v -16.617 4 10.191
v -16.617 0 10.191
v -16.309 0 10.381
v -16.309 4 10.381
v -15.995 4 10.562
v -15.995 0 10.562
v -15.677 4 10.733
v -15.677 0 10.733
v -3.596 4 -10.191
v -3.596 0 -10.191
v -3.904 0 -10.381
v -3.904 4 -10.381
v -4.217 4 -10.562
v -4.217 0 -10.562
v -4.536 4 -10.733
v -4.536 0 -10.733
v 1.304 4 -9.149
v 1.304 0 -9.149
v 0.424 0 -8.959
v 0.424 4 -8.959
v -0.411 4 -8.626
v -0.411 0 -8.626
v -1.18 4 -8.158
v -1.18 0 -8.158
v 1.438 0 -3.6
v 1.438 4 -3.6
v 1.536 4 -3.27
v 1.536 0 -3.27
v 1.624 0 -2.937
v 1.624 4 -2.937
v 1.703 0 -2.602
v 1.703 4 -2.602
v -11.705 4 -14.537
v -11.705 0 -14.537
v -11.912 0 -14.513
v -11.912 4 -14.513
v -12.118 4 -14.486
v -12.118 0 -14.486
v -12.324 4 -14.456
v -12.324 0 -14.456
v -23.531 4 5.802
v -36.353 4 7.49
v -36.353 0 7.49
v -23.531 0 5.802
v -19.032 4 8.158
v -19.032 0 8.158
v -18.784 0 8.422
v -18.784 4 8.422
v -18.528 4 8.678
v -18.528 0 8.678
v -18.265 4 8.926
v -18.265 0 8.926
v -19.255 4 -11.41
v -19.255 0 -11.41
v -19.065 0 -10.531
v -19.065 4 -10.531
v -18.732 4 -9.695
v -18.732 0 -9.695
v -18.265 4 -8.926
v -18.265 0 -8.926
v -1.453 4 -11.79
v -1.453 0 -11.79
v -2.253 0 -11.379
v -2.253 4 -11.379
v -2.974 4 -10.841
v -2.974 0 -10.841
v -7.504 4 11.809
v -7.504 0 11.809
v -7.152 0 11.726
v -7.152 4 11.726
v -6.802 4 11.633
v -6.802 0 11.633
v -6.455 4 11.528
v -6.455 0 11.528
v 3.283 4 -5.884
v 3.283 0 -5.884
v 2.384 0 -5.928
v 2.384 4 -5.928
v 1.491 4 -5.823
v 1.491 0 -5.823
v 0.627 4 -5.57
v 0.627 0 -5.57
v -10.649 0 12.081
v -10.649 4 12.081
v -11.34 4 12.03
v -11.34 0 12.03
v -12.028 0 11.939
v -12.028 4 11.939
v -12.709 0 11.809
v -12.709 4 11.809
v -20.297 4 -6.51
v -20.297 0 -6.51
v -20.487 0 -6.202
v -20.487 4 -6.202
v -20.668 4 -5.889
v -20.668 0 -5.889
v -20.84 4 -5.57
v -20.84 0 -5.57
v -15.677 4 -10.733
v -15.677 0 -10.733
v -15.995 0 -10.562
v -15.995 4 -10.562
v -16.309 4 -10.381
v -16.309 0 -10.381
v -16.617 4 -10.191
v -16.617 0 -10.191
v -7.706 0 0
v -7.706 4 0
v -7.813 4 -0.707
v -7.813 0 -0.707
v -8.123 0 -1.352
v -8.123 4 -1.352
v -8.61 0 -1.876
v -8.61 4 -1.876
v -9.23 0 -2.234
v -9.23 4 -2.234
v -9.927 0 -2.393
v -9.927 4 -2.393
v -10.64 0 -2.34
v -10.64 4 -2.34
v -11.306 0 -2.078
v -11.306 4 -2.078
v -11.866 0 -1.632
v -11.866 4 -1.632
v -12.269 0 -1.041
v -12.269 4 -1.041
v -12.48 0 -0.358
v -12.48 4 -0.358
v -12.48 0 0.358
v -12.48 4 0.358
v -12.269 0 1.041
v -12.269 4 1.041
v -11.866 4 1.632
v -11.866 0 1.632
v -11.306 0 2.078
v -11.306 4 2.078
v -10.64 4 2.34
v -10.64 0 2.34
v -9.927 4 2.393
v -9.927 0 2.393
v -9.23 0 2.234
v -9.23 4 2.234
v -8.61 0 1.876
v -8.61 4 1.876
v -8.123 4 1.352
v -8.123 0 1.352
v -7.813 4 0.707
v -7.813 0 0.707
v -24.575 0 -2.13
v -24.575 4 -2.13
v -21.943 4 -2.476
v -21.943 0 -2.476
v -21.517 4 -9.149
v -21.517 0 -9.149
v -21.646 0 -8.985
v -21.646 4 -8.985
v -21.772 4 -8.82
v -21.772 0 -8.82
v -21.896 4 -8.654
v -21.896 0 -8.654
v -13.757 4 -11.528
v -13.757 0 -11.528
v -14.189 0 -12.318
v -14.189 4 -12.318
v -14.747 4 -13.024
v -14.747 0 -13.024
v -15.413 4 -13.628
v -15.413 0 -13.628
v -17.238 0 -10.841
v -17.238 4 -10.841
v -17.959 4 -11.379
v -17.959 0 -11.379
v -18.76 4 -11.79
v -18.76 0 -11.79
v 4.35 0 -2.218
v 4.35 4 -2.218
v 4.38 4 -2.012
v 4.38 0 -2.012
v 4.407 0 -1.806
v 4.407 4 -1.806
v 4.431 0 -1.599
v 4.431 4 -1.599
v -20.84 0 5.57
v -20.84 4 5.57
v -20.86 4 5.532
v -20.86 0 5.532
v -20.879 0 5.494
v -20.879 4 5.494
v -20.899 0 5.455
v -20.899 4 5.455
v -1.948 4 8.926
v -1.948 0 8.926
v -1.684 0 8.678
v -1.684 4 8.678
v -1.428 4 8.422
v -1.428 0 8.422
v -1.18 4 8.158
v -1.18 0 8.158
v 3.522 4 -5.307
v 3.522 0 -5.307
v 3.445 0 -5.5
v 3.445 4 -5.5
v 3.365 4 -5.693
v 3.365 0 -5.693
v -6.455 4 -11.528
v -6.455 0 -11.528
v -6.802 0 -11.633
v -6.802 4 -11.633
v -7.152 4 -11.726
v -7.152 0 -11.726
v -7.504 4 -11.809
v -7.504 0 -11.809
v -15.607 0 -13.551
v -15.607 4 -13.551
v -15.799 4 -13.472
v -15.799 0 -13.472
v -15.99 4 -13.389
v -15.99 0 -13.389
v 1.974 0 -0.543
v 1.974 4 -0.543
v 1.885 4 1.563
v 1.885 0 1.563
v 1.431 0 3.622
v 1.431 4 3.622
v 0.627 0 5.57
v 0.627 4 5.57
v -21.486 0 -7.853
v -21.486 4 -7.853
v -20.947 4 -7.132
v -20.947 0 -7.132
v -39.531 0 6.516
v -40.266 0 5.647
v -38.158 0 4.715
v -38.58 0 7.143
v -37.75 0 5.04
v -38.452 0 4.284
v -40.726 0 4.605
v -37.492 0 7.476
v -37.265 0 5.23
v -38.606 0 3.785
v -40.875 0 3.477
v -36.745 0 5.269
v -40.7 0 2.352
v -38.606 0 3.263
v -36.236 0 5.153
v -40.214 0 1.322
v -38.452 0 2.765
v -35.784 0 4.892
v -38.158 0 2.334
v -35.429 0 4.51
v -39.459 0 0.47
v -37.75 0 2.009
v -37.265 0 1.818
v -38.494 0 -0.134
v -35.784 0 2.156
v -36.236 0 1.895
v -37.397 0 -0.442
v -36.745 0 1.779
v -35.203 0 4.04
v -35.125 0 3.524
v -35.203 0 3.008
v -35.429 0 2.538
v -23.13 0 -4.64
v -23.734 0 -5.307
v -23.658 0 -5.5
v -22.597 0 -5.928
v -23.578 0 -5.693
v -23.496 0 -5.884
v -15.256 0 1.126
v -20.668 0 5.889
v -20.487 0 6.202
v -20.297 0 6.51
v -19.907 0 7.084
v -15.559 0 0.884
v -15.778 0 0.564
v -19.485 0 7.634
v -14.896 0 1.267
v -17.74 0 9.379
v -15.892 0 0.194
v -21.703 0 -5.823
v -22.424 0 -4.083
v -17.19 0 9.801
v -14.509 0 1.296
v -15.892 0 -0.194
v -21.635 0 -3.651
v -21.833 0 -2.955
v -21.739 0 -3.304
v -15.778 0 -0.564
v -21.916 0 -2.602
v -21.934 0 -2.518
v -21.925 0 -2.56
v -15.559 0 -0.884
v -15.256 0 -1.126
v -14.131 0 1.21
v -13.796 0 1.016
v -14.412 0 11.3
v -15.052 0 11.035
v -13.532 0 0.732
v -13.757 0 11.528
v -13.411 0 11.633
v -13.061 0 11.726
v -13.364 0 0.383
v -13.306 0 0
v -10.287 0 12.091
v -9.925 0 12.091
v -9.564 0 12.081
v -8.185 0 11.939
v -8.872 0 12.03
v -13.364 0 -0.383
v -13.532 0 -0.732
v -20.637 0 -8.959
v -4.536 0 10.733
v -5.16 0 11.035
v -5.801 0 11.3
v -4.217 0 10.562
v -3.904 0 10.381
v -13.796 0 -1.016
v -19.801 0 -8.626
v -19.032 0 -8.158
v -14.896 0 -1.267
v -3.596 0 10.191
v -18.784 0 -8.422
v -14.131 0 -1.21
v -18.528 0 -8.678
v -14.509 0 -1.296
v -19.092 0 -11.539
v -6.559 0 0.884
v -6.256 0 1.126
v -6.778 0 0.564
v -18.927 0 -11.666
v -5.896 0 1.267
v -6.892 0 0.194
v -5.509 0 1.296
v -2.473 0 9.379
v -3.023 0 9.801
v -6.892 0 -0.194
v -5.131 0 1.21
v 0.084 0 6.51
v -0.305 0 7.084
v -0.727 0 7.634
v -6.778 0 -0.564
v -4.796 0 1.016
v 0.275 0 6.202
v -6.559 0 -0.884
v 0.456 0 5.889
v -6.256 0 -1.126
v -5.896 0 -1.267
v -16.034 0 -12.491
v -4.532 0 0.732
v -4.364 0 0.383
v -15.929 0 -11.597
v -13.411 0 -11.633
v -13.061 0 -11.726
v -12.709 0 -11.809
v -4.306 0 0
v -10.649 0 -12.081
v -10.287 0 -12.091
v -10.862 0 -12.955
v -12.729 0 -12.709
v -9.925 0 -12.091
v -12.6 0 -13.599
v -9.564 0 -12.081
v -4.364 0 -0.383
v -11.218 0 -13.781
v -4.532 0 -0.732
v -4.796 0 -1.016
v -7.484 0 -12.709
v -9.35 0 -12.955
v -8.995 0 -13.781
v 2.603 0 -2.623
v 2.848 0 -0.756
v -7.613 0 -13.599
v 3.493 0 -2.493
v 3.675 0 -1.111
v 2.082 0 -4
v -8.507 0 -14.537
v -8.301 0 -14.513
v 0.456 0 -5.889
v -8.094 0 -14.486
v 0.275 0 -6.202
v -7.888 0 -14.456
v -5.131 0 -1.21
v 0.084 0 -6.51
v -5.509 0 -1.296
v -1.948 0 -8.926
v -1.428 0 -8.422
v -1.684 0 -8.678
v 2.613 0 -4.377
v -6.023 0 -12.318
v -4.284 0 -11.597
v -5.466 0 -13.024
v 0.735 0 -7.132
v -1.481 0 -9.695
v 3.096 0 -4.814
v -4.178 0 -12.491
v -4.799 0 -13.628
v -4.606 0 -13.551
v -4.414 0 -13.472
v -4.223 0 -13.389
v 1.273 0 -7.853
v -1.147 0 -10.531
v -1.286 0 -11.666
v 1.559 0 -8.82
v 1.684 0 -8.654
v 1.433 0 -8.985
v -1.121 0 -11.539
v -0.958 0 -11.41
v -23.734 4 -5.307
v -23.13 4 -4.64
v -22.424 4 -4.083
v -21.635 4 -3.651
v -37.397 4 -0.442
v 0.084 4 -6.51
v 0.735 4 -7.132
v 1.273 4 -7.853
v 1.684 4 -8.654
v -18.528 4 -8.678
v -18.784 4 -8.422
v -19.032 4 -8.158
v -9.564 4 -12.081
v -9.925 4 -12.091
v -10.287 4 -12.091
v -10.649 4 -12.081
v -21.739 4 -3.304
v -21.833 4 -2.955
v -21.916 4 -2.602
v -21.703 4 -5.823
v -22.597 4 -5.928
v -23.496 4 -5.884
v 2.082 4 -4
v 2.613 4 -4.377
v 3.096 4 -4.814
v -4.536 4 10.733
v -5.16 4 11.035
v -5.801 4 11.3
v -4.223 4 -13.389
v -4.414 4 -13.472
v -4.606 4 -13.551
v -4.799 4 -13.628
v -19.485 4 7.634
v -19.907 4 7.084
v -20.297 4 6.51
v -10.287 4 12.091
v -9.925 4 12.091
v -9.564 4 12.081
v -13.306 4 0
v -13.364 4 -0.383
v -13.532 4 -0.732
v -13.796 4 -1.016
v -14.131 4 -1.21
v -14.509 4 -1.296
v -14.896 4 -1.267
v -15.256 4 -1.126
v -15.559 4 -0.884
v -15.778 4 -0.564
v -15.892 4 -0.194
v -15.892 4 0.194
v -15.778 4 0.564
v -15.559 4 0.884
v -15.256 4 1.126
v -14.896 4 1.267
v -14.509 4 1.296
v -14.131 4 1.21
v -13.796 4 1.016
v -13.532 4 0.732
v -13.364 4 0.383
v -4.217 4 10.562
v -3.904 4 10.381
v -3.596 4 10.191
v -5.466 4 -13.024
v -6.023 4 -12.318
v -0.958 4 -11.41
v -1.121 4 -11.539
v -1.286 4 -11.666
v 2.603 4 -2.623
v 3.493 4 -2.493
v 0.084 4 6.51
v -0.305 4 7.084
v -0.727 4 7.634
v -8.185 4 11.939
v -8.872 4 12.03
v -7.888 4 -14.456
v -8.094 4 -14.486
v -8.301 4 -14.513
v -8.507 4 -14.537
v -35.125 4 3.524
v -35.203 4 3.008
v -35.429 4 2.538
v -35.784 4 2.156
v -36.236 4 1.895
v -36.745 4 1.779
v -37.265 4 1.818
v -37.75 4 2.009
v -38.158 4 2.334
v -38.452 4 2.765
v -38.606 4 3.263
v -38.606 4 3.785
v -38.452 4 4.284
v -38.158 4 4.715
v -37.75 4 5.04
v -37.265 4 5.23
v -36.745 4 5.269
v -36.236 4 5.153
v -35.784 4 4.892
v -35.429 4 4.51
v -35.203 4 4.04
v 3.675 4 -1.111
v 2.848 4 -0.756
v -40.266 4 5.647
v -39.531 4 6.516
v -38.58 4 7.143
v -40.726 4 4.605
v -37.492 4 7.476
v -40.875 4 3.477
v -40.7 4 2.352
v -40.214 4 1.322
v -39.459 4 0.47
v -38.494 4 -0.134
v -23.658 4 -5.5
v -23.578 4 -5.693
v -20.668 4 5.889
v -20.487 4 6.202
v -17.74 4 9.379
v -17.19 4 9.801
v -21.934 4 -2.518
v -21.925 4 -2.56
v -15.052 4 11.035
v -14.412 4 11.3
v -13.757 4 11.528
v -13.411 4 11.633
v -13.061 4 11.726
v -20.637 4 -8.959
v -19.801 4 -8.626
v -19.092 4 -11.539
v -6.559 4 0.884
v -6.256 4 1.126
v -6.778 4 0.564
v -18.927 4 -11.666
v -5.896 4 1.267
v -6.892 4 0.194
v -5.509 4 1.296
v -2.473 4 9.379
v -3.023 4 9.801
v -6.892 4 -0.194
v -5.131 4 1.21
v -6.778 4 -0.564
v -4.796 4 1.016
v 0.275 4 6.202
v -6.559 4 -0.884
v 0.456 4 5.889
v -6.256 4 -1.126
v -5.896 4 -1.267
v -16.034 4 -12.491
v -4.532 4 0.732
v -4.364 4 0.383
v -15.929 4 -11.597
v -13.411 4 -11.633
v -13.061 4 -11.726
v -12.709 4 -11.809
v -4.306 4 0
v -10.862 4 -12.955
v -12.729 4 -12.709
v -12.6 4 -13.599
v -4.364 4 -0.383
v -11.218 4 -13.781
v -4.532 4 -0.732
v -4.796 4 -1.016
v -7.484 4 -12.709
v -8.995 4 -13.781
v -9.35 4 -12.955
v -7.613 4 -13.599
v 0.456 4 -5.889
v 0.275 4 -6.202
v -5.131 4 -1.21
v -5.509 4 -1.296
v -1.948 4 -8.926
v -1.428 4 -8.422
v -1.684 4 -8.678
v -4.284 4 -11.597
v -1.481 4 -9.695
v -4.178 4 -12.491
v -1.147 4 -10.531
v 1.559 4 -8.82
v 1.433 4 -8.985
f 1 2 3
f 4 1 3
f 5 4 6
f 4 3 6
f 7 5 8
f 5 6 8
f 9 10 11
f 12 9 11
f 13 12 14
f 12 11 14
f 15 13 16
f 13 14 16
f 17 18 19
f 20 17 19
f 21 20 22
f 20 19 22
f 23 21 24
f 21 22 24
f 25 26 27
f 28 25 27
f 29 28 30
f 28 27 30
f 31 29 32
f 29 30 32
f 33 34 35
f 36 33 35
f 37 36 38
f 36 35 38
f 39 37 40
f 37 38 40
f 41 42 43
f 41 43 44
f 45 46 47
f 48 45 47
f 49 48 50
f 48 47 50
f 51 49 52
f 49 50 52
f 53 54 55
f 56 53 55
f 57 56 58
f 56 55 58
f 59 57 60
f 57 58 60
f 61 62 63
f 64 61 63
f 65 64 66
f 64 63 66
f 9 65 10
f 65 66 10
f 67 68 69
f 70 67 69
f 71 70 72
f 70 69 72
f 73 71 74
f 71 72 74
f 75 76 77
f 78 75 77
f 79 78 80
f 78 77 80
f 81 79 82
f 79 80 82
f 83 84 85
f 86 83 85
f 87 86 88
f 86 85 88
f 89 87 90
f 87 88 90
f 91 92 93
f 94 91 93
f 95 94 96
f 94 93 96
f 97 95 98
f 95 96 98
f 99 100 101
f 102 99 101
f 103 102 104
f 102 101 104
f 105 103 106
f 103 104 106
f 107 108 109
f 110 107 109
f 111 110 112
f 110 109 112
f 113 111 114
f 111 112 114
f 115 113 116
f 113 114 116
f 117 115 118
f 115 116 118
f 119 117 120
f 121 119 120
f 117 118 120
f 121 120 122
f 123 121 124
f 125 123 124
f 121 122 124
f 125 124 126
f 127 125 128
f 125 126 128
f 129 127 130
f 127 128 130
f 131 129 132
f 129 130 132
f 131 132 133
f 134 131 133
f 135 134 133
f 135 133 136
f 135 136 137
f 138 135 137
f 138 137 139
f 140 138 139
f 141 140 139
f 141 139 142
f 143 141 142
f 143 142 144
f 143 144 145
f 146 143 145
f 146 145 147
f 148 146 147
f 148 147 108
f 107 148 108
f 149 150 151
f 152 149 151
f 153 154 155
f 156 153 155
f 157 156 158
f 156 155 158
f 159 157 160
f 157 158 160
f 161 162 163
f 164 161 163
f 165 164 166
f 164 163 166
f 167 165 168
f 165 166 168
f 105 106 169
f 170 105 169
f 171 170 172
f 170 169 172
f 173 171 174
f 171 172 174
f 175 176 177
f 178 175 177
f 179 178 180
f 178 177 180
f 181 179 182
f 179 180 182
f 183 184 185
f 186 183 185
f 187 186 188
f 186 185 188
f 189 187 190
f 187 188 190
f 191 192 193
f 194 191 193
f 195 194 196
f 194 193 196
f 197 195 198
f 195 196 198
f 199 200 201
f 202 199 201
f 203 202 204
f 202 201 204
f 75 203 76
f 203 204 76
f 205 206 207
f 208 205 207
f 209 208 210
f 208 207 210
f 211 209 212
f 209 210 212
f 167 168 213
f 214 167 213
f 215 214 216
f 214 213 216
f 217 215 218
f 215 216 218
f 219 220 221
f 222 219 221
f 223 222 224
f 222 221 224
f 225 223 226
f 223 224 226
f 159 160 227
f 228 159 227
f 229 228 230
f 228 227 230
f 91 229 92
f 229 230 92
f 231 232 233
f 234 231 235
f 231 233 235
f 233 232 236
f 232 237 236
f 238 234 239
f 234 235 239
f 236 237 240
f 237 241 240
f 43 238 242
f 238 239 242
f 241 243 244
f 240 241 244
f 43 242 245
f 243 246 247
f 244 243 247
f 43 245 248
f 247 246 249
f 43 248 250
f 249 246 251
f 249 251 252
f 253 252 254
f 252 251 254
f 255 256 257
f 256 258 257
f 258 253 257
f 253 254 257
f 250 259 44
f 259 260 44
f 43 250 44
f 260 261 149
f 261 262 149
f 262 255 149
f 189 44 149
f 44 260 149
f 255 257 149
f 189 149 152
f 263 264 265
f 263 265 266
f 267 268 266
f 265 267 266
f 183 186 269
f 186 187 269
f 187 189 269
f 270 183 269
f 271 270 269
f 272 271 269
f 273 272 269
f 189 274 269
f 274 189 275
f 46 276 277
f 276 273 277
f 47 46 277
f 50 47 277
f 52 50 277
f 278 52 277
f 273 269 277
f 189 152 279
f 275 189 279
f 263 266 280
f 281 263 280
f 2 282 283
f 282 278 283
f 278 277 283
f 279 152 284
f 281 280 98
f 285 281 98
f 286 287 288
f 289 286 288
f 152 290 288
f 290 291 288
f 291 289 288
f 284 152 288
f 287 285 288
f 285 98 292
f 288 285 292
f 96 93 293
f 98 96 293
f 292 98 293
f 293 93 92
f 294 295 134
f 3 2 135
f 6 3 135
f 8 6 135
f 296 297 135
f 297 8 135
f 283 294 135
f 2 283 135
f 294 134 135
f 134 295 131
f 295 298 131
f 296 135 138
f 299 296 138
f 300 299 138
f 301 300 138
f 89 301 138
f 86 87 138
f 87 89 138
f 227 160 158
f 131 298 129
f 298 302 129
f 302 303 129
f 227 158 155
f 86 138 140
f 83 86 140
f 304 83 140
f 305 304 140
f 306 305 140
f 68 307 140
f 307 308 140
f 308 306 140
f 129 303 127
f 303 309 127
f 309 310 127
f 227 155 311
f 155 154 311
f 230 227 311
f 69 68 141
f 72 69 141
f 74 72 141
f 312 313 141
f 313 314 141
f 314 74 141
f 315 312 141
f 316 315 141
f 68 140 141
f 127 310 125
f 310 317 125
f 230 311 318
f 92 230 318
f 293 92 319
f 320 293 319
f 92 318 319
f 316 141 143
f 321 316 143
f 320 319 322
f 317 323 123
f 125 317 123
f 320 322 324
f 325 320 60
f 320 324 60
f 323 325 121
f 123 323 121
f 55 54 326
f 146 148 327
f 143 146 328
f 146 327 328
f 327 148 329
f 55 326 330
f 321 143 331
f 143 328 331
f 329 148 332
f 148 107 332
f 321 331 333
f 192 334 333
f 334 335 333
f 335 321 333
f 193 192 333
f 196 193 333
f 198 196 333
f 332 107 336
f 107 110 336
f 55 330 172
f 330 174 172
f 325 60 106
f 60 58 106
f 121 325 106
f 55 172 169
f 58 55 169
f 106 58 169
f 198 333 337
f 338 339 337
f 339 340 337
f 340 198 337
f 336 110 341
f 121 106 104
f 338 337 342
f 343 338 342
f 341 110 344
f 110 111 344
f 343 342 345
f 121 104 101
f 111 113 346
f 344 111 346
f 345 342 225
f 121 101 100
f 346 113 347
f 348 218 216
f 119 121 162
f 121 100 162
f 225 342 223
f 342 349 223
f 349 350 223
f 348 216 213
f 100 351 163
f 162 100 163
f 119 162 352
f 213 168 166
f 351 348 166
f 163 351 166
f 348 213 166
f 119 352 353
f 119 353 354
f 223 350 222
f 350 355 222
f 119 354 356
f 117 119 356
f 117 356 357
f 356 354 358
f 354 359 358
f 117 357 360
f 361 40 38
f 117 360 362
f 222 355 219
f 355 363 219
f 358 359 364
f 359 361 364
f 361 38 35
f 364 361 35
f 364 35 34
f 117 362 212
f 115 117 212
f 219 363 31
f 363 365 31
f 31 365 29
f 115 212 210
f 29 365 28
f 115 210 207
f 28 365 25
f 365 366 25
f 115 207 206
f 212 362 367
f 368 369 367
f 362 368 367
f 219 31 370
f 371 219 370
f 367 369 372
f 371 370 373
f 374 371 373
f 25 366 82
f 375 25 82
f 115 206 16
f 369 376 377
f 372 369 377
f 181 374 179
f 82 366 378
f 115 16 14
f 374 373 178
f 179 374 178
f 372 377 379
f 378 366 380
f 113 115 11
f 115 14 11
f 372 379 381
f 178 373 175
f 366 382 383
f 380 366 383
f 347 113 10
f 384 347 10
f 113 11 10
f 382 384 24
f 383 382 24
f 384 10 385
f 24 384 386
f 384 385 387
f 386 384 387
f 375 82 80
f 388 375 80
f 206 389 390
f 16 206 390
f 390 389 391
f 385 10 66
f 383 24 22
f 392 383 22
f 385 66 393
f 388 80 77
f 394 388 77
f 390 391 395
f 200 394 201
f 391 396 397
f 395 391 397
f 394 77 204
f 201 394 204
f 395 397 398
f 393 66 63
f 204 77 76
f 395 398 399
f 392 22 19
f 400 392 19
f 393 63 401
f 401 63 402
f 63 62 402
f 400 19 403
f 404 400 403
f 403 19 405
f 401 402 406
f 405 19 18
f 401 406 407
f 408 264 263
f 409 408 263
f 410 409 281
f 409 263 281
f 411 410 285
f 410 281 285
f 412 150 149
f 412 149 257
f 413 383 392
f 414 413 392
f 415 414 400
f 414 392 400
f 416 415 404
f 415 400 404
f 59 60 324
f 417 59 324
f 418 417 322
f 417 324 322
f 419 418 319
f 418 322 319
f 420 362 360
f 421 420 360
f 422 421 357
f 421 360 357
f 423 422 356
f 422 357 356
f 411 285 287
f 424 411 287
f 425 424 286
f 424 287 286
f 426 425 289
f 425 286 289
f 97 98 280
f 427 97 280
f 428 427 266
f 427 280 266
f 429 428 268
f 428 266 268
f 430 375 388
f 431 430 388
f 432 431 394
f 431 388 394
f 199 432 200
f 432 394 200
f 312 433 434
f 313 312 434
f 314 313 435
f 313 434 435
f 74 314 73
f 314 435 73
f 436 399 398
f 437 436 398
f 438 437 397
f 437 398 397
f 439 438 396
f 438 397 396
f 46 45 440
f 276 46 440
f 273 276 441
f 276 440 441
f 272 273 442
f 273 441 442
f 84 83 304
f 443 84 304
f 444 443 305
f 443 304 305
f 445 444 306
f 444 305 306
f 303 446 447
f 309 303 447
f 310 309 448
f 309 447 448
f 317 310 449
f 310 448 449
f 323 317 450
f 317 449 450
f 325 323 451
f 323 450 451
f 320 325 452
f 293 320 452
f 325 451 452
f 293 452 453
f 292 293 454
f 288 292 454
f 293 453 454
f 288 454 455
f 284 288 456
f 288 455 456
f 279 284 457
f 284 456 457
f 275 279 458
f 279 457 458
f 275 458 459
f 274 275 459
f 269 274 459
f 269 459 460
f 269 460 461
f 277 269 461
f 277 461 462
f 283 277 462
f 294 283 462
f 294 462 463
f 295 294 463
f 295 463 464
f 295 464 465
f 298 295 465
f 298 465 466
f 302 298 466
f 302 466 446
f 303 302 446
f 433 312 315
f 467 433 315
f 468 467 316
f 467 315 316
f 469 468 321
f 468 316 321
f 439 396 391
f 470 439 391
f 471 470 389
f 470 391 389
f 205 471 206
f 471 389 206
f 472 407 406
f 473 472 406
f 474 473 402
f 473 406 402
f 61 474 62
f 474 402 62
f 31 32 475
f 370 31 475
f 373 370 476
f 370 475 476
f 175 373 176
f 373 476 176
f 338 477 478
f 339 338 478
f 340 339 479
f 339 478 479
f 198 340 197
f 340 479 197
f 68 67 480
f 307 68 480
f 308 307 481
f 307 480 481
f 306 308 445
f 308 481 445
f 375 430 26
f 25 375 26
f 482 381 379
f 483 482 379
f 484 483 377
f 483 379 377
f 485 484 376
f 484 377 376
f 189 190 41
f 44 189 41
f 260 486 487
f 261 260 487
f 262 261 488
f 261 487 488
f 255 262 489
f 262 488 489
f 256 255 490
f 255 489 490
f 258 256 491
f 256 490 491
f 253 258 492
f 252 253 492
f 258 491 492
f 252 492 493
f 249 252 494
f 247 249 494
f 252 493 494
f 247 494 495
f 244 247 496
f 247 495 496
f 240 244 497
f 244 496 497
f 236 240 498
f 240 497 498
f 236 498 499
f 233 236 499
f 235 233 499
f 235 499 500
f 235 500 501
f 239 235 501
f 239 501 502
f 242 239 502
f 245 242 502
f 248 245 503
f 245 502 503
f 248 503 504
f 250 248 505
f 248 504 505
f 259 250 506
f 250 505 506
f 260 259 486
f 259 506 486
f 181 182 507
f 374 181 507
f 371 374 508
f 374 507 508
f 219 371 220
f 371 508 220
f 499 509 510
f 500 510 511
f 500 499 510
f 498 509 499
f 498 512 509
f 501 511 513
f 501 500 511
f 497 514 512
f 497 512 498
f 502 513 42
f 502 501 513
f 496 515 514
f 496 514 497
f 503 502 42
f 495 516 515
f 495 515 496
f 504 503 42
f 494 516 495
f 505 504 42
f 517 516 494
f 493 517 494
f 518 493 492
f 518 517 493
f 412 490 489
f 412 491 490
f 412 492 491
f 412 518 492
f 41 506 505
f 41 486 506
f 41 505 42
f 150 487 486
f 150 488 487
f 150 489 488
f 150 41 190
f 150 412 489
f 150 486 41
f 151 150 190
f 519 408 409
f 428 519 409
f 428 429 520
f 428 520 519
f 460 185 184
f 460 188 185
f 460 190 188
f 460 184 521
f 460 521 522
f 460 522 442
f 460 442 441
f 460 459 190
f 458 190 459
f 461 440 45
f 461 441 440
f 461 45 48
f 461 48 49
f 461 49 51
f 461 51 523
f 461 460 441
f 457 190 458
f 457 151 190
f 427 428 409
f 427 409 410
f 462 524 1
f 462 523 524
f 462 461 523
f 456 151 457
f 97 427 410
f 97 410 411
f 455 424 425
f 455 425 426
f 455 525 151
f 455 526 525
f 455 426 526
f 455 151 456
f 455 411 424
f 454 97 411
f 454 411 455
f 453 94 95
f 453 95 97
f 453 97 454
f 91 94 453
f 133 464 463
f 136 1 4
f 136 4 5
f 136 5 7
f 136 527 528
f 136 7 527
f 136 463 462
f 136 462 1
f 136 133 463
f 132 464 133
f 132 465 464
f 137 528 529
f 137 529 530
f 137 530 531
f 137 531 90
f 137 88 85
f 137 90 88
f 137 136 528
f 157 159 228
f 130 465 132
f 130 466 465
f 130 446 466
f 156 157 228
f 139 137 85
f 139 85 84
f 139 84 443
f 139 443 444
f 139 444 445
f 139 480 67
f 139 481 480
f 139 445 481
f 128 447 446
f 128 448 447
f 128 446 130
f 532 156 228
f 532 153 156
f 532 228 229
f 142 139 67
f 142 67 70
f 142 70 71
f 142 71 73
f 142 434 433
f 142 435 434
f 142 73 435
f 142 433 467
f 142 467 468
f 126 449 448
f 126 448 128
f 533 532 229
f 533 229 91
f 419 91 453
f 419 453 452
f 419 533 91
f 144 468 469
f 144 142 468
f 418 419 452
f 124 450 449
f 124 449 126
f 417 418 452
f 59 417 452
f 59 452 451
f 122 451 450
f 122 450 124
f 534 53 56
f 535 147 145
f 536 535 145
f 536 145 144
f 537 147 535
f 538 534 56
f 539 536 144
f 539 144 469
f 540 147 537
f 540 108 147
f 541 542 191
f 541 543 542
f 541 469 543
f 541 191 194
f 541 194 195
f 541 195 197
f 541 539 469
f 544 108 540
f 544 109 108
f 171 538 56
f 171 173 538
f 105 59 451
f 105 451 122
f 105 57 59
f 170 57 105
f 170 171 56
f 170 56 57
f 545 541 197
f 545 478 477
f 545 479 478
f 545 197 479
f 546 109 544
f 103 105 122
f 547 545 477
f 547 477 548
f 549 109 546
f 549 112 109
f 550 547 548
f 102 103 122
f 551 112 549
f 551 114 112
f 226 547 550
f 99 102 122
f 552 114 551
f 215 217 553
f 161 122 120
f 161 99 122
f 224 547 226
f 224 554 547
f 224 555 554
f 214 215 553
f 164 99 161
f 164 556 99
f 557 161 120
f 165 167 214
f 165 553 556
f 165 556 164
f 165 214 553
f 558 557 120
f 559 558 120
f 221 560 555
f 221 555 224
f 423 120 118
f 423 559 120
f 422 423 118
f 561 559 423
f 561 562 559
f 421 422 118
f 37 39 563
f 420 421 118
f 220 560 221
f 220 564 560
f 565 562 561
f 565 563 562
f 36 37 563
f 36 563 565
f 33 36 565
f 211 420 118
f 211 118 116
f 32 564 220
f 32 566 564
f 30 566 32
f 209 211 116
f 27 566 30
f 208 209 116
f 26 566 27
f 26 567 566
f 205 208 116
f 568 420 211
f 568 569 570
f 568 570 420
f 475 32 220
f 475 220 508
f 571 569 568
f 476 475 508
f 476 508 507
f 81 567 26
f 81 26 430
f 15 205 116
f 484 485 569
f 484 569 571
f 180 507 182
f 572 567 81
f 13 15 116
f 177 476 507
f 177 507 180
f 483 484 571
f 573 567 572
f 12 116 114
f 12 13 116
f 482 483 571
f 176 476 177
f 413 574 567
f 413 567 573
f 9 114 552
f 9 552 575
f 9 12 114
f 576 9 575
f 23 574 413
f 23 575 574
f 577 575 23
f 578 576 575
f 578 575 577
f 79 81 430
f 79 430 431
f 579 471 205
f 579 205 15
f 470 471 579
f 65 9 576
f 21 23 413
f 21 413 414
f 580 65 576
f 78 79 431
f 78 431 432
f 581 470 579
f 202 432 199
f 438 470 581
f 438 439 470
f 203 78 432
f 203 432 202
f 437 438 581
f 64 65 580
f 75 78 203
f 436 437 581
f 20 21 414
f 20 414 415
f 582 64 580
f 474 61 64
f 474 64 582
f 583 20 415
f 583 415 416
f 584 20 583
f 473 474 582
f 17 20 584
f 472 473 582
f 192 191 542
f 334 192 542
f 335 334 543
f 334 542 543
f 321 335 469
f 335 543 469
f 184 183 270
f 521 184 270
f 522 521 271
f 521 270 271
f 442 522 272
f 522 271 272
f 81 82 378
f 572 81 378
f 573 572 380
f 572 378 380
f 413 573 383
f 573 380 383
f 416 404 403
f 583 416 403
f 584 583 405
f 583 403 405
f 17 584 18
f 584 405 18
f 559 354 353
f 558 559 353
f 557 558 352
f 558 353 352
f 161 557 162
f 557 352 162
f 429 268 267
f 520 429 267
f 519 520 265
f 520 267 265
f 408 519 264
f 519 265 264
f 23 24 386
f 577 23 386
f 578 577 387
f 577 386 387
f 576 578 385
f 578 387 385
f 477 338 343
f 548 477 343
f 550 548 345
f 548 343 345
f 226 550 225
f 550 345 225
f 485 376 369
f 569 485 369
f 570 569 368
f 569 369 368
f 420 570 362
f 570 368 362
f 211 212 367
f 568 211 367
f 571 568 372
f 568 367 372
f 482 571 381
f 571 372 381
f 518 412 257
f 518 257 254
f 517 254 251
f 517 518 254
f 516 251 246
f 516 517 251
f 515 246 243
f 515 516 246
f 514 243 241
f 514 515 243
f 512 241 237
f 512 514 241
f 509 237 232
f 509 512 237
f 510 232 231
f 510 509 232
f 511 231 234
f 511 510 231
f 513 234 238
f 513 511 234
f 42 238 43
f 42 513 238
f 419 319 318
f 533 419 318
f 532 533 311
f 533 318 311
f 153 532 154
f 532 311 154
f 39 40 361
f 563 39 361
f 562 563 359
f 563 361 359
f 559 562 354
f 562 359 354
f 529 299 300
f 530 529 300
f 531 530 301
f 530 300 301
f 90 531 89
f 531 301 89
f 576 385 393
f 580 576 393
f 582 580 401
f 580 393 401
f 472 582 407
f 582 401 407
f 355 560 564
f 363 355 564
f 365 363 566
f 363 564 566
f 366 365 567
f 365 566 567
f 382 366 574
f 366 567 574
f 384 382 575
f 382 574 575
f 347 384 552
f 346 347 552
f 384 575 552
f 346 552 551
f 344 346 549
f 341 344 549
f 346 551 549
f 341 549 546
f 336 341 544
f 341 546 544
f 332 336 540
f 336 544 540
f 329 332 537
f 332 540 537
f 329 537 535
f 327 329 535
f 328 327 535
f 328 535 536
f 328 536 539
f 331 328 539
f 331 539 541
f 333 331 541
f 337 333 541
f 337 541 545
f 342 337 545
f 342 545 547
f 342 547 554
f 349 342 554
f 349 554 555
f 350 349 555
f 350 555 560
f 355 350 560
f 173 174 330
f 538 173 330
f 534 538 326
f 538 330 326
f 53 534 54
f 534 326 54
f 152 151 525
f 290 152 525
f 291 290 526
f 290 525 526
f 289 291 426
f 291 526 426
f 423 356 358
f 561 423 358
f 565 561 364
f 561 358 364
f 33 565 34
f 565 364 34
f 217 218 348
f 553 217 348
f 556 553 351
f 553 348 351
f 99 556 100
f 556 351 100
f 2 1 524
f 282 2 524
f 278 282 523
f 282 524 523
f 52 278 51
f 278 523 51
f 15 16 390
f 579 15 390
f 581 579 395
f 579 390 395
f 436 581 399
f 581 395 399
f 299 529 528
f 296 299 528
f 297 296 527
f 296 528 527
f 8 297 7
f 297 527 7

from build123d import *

# Parameters (mm, degrees)
SKETCH1_R           = 1.5
BOSS_EXTRUDE1_DEPTH = 4
SKETCH3_R           = 1.75
BOSS_EXTRUDE2_DEPTH = 4
CUT_EXTRUDE1_DEPTH  = 4
CUT_EXTRUDE2_REACH  = 6
SKETCH5_R           = 1.3
SKETCH5_R_2         = 2.4


with BuildPart() as part:
    # Sketch1 → Boss-Extrude1 (new body)
    with BuildSketch(Plane(origin=(0, 0, 0), x_dir=(1, 0, 0), z_dir=(0, 1, 0))):
        with BuildLine():
            Line((20.643657446, 4), (2.081641936, 4))
            ThreePointArc((2.081641936, 4), (2.861028333, 4.588201733), (3.521749436, 5.30713988))
            ThreePointArc((3.521749436, 5.30713988), (3.405395609, 5.596745198), (3.282888305, 5.883801663))
            ThreePointArc((3.282888305, 5.883801663), (1.93527598, 5.894040025), (0.627094961, 5.57027124))
            ThreePointArc((0.627094961, 5.57027124), (0.366286148, 6.046375), (0.084372603, 6.510293938))
            ThreePointArc((0.084372603, 6.510293938), (1.018855105, 7.48132754), (1.683794586, 8.65351323))
            ThreePointArc((1.683794586, 8.65351323), (1.496450048, 8.903135899), (1.303821399, 9.148703928))
            ThreePointArc((1.303821399, 9.148703928), (-0.000522033, 8.809805691), (-1.180330337, 8.158486898))
            ThreePointArc((-1.180330337, 8.158486898), (-1.555477026, 8.550865528), (-1.947855656, 8.926012217))
            ThreePointArc((-1.947855656, 8.926012217), (-1.296536862, 10.105820521), (-0.957638625, 11.410163953))
            ThreePointArc((-0.957638625, 11.410163953), (-1.203206655, 11.602792602), (-1.452829324, 11.79013714))
            ThreePointArc((-1.452829324, 11.79013714), (-2.625015014, 11.125197659), (-3.596048616, 10.190715157))
            ThreePointArc((-3.596048616, 10.190715157), (-4.059967554, 10.472628702), (-4.536071314, 10.733437515))
            ThreePointArc((-4.536071314, 10.733437515), (-4.212302529, 12.041618533), (-4.222540891, 13.389230859))
            ThreePointArc((-4.222540891, 13.389230859), (-4.509597355, 13.511738163), (-4.799202674, 13.62809199))
            ThreePointArc((-4.799202674, 13.62809199), (-5.759348103, 12.682425791), (-6.455432668, 11.528463019))
            ThreePointArc((-6.455432668, 11.528463019), (-6.976508546, 11.680699536), (-7.503891752, 11.809396783))
            ThreePointArc((-7.503891752, 11.809396783), (-7.529737283, 13.156800143), (-7.888414517, 14.455843809))
            ThreePointArc((-7.888414517, 14.455843809), (-8.197396993, 14.499881098), (-8.507248835, 14.537314892))
            ThreePointArc((-8.507248835, 14.537314892), (-9.18992168, 13.375367565), (-9.563620196, 12.080565177))
            ThreePointArc((-9.563620196, 12.080565177), (-10.106342554, 12.09275), (-10.649064912, 12.080565177))
            ThreePointArc((-10.649064912, 12.080565177), (-11.022763428, 13.375367565), (-11.705436272, 14.537314892))
            ThreePointArc((-11.705436272, 14.537314892), (-12.015288115, 14.499881098), (-12.324270591, 14.455843809))
            ThreePointArc((-12.324270591, 14.455843809), (-12.682947825, 13.156800143), (-12.708793355, 11.809396783))
            ThreePointArc((-12.708793355, 11.809396783), (-13.236176561, 11.680699536), (-13.757252439, 11.528463019))
            ThreePointArc((-13.757252439, 11.528463019), (-14.453337005, 12.682425791), (-15.413482434, 13.62809199))
            ThreePointArc((-15.413482434, 13.62809199), (-15.703087752, 13.511738163), (-15.990144217, 13.389230859))
            ThreePointArc((-15.990144217, 13.389230859), (-16.000382579, 12.041618533), (-15.676613793, 10.733437515))
            ThreePointArc((-15.676613793, 10.733437515), (-16.152717554, 10.472628702), (-16.616636492, 10.190715157))
            ThreePointArc((-16.616636492, 10.190715157), (-17.587670094, 11.125197659), (-18.759855783, 11.79013714))
            ThreePointArc((-18.759855783, 11.79013714), (-19.009478453, 11.602792602), (-19.255046482, 11.410163953))
            ThreePointArc((-19.255046482, 11.410163953), (-18.916148245, 10.105820521), (-18.264829452, 8.926012217))
            ThreePointArc((-18.264829452, 8.926012217), (-18.657208082, 8.550865528), (-19.032354771, 8.158486898))
            ThreePointArc((-19.032354771, 8.158486898), (-20.212163074, 8.809805691), (-21.516506507, 9.148703928))
            ThreePointArc((-21.516506507, 9.148703928), (-21.709135156, 8.903135899), (-21.896479694, 8.65351323))
            ThreePointArc((-21.896479694, 8.65351323), (-21.231540213, 7.48132754), (-20.297057711, 6.510293938))
            ThreePointArc((-20.297057711, 6.510293938), (-20.578971255, 6.046375), (-20.839780068, 5.57027124))
            ThreePointArc((-20.839780068, 5.57027124), (-22.147961087, 5.894040025), (-23.495573413, 5.883801663))
            ThreePointArc((-23.495573413, 5.883801663), (-23.618080717, 5.596745198), (-23.734434544, 5.30713988))
            ThreePointArc((-23.734434544, 5.30713988), (-22.788768345, 4.346994451), (-21.634805572, 3.650909885))
            ThreePointArc((-21.634805572, 3.650909885), (-21.78704209, 3.129834008), (-21.915739337, 2.602450802))
            ThreePointArc((-21.915739337, 2.602450802), (-23.263142697, 2.576605271), (-24.562186363, 2.217928037))
            ThreePointArc((-24.562186363, 2.217928037), (-24.606223651, 1.908945561), (-24.643657446, 1.599093719))
            ThreePointArc((-24.643657446, 1.599093719), (-23.481710119, 0.916420874), (-22.186907731, 0.542722358))
            ThreePointArc((-22.186907731, 0.542722358), (-22.199092554, 0), (-22.186907731, -0.542722358))
            ThreePointArc((-22.186907731, -0.542722358), (-23.481710119, -0.916420874), (-24.643657446, -1.599093719))
            ThreePointArc((-24.643657446, -1.599093719), (-24.606223651, -1.908945561), (-24.562186363, -2.217928037))
            ThreePointArc((-24.562186363, -2.217928037), (-23.263142697, -2.576605271), (-21.915739337, -2.602450802))
            ThreePointArc((-21.915739337, -2.602450802), (-21.78704209, -3.129834008), (-21.634805572, -3.650909885))
            ThreePointArc((-21.634805572, -3.650909885), (-22.788768345, -4.346994451), (-23.734434544, -5.30713988))
            ThreePointArc((-23.734434544, -5.30713988), (-23.618080717, -5.596745198), (-23.495573413, -5.883801663))
            ThreePointArc((-23.495573413, -5.883801663), (-22.147961087, -5.894040025), (-20.839780068, -5.57027124))
            ThreePointArc((-20.839780068, -5.57027124), (-20.578971255, -6.046375), (-20.297057711, -6.510293938))
            ThreePointArc((-20.297057711, -6.510293938), (-21.231540213, -7.48132754), (-21.896479694, -8.65351323))
            ThreePointArc((-21.896479694, -8.65351323), (-21.709135156, -8.903135899), (-21.516506507, -9.148703928))
            ThreePointArc((-21.516506507, -9.148703928), (-20.212163074, -8.809805691), (-19.032354771, -8.158486898))
            ThreePointArc((-19.032354771, -8.158486898), (-18.657208082, -8.550865528), (-18.264829452, -8.926012217))
            ThreePointArc((-18.264829452, -8.926012217), (-18.916148245, -10.105820521), (-19.255046482, -11.410163953))
            ThreePointArc((-19.255046482, -11.410163953), (-19.009478453, -11.602792602), (-18.759855783, -11.79013714))
            ThreePointArc((-18.759855783, -11.79013714), (-17.587670094, -11.125197659), (-16.616636492, -10.190715157))
            ThreePointArc((-16.616636492, -10.190715157), (-16.152717554, -10.472628702), (-15.676613793, -10.733437515))
            ThreePointArc((-15.676613793, -10.733437515), (-16.000382579, -12.041618533), (-15.990144217, -13.389230859))
            ThreePointArc((-15.990144217, -13.389230859), (-15.703087752, -13.511738163), (-15.413482434, -13.62809199))
            ThreePointArc((-15.413482434, -13.62809199), (-14.453337005, -12.682425791), (-13.757252439, -11.528463019))
            ThreePointArc((-13.757252439, -11.528463019), (-13.236176561, -11.680699536), (-12.708793355, -11.809396783))
            ThreePointArc((-12.708793355, -11.809396783), (-12.682947825, -13.156800143), (-12.324270591, -14.455843809))
            ThreePointArc((-12.324270591, -14.455843809), (-12.015288115, -14.499881098), (-11.705436272, -14.537314892))
            ThreePointArc((-11.705436272, -14.537314892), (-11.022763428, -13.375367565), (-10.649064912, -12.080565177))
            ThreePointArc((-10.649064912, -12.080565177), (-10.106342554, -12.09275), (-9.563620196, -12.080565177))
            ThreePointArc((-9.563620196, -12.080565177), (-9.18992168, -13.375367565), (-8.507248835, -14.537314892))
            ThreePointArc((-8.507248835, -14.537314892), (-8.197396993, -14.499881098), (-7.888414517, -14.455843809))
            ThreePointArc((-7.888414517, -14.455843809), (-7.529737283, -13.156800143), (-7.503891752, -11.809396783))
            ThreePointArc((-7.503891752, -11.809396783), (-6.976508546, -11.680699536), (-6.455432668, -11.528463019))
            ThreePointArc((-6.455432668, -11.528463019), (-5.759348103, -12.682425791), (-4.799202674, -13.62809199))
            ThreePointArc((-4.799202674, -13.62809199), (-4.509597355, -13.511738163), (-4.222540891, -13.389230859))
            ThreePointArc((-4.222540891, -13.389230859), (-4.212302529, -12.041618533), (-4.536071314, -10.733437515))
            ThreePointArc((-4.536071314, -10.733437515), (-4.059967554, -10.472628702), (-3.596048616, -10.190715157))
            ThreePointArc((-3.596048616, -10.190715157), (-2.625015014, -11.125197659), (-1.452829324, -11.79013714))
            ThreePointArc((-1.452829324, -11.79013714), (-1.203206655, -11.602792602), (-0.957638625, -11.410163953))
            ThreePointArc((-0.957638625, -11.410163953), (-1.296536862, -10.105820521), (-1.947855656, -8.926012217))
            ThreePointArc((-1.947855656, -8.926012217), (-1.555477026, -8.550865528), (-1.180330337, -8.158486898))
            ThreePointArc((-1.180330337, -8.158486898), (-0.000522033, -8.809805691), (1.303821399, -9.148703928))
            ThreePointArc((1.303821399, -9.148703928), (1.496450048, -8.903135899), (1.683794586, -8.65351323))
            ThreePointArc((1.683794586, -8.65351323), (1.018855105, -7.48132754), (0.084372603, -6.510293938))
            ThreePointArc((0.084372603, -6.510293938), (0.366286148, -6.046375), (0.627094961, -5.57027124))
            ThreePointArc((0.627094961, -5.57027124), (1.93527598, -5.894040025), (3.282888305, -5.883801663))
            ThreePointArc((3.282888305, -5.883801663), (3.405395609, -5.596745198), (3.521749436, -5.30713988))
            ThreePointArc((3.521749436, -5.30713988), (2.861028333, -4.588201733), (2.081641936, -4))
            Line((2.081641936, -4), (20.643657446, -4))
            ThreePointArc((20.643657446, -4), (24.643657446, 0), (20.643657446, 4))
        make_face()
        with Locations((-10.106342554, 0)):
            Circle(SKETCH1_R, mode=Mode.SUBTRACT)
        with Locations((20.643657446, 0)):
            Circle(SKETCH1_R, mode=Mode.SUBTRACT)
    extrude(amount=BOSS_EXTRUDE1_DEPTH)

    # Sketch3 → Boss-Extrude2 (add)
    with BuildSketch(Plane(origin=(0, 4, 0), x_dir=(1, 0, 0), z_dir=(0, 1, 0))):
        with BuildLine():
            ThreePointArc((-9.584237785, -3.965779445), (-14.072121999, -0.522104769), (-10.628447323, 3.965779445))
            Line((-10.628447323, 3.965779445), (-37.39745858, 0.441572256))
            ThreePointArc((-37.39745858, 0.441572256), (-40.841133256, -4.046311959), (-36.353249042, -7.489986635))
            Line((-36.353249042, -7.489986635), (-9.584237785, -3.965779445))
        make_face()
        with Locations((-36.875353811, -3.52420719)):
            Circle(SKETCH3_R, mode=Mode.SUBTRACT)
    extrude(amount=-BOSS_EXTRUDE2_DEPTH)

    # Sketch4 → Cut-Extrude1 (cut)
    with BuildSketch(Plane(origin=(0, 4, 0), x_dir=(1, 0, 0), z_dir=(0, 1, 0))):
        with BuildLine():
            ThreePointArc((20.643657446, -4), (24.643657446, 0), (20.643657446, 4))
            Line((20.643657446, 4), (2.081641936, 4))
            Line((2.081641936, 4), (1.43808022, 3.600125745))
            ThreePointArc((1.43808022, 3.600125745), (1.581217534, 3.104116905), (1.70305423, 2.602450802))
            ThreePointArc((1.70305423, 2.602450802), (3.050457589, 2.576605271), (4.349501255, 2.217928037))
            ThreePointArc((4.349501255, 2.217928037), (4.393538544, 1.908945561), (4.430972339, 1.599093719))
            ThreePointArc((4.430972339, 1.599093719), (3.269025011, 0.916420874), (1.974222624, 0.542722358))
            ThreePointArc((1.974222624, 0.542722358), (1.70305423, -2.602450802), (0.627094961, -5.57027124))
            ThreePointArc((0.627094961, -5.57027124), (1.93527598, -5.894040025), (3.282888305, -5.883801663))
            ThreePointArc((3.282888305, -5.883801663), (3.405395609, -5.596745198), (3.521749436, -5.30713988))
            ThreePointArc((3.521749436, -5.30713988), (2.861028333, -4.588201733), (2.081641936, -4))
            Line((2.081641936, -4), (20.643657446, -4))
        make_face()
        with BuildLine():
            ThreePointArc((1.683794586, -8.65351323), (1.018855105, -7.48132754), (0.084372603, -6.510293938))
            ThreePointArc((0.084372603, -6.510293938), (-0.512518948, -7.361599771), (-1.180330337, -8.158486898))
            ThreePointArc((-1.180330337, -8.158486898), (-0.000522033, -8.809805691), (1.303821399, -9.148703928))
            ThreePointArc((1.303821399, -9.148703928), (1.496450048, -8.903135899), (1.683794586, -8.65351323))
        make_face()
        with BuildLine():
            ThreePointArc((-0.957638625, -11.410163953), (-1.296536862, -10.105820521), (-1.947855656, -8.926012217))
            ThreePointArc((-1.947855656, -8.926012217), (-2.744742783, -9.593823606), (-3.596048616, -10.190715157))
            ThreePointArc((-3.596048616, -10.190715157), (-2.625015014, -11.125197659), (-1.452829324, -11.79013714))
            ThreePointArc((-1.452829324, -11.79013714), (-1.203206655, -11.602792602), (-0.957638625, -11.410163953))
        make_face()
        with BuildLine():
            ThreePointArc((-4.222540891, -13.389230859), (-4.212302529, -12.041618533), (-4.536071314, -10.733437515))
            ThreePointArc((-4.536071314, -10.733437515), (-5.478647477, -11.172244217), (-6.455432668, -11.528463019))
            ThreePointArc((-6.455432668, -11.528463019), (-5.759348103, -12.682425791), (-4.799202674, -13.62809199))
            ThreePointArc((-4.799202674, -13.62809199), (-4.509597355, -13.511738163), (-4.222540891, -13.389230859))
        make_face()
        with BuildLine():
            ThreePointArc((-7.888414517, -14.455843809), (-7.529737283, -13.156800143), (-7.503891752, -11.809396783))
            ThreePointArc((-7.503891752, -11.809396783), (-8.527921943, -11.989294847), (-9.563620196, -12.080565177))
            ThreePointArc((-9.563620196, -12.080565177), (-9.18992168, -13.375367565), (-8.507248835, -14.537314892))
            ThreePointArc((-8.507248835, -14.537314892), (-8.197396993, -14.499881098), (-7.888414517, -14.455843809))
        make_face()
        with BuildLine():
            ThreePointArc((-11.705436272, -14.537314892), (-11.022763428, -13.375367565), (-10.649064912, -12.080565177))
            ThreePointArc((-10.649064912, -12.080565177), (-11.684763165, -11.989294847), (-12.708793355, -11.809396783))
            ThreePointArc((-12.708793355, -11.809396783), (-12.682947825, -13.156800143), (-12.324270591, -14.455843809))
            ThreePointArc((-12.324270591, -14.455843809), (-12.015288115, -14.499881098), (-11.705436272, -14.537314892))
        make_face()
        with BuildLine():
            ThreePointArc((-15.413482434, -13.62809199), (-14.453337005, -12.682425791), (-13.757252439, -11.528463019))
            ThreePointArc((-13.757252439, -11.528463019), (-14.734037631, -11.172244217), (-15.676613793, -10.733437515))
            ThreePointArc((-15.676613793, -10.733437515), (-16.000382579, -12.041618533), (-15.990144217, -13.389230859))
            ThreePointArc((-15.990144217, -13.389230859), (-15.703087752, -13.511738163), (-15.413482434, -13.62809199))
        make_face()
        with BuildLine():
            ThreePointArc((-18.759855783, -11.79013714), (-17.587670094, -11.125197659), (-16.616636492, -10.190715157))
            ThreePointArc((-16.616636492, -10.190715157), (-17.467942324, -9.593823606), (-18.264829452, -8.926012217))
            ThreePointArc((-18.264829452, -8.926012217), (-18.916148245, -10.105820521), (-19.255046482, -11.410163953))
            ThreePointArc((-19.255046482, -11.410163953), (-19.009478453, -11.602792602), (-18.759855783, -11.79013714))
        make_face()
        with BuildLine():
            ThreePointArc((-21.516506507, -9.148703928), (-20.212163074, -8.809805691), (-19.032354771, -8.158486898))
            ThreePointArc((-19.032354771, -8.158486898), (-19.70016616, -7.361599771), (-20.297057711, -6.510293938))
            ThreePointArc((-20.297057711, -6.510293938), (-21.231540213, -7.48132754), (-21.896479694, -8.65351323))
            ThreePointArc((-21.896479694, -8.65351323), (-21.709135156, -8.903135899), (-21.516506507, -9.148703928))
        make_face()
        with BuildLine():
            ThreePointArc((-21.942853375, 2.47620963), (-21.92946485, 2.539366405), (-21.915739337, 2.602450802))
            ThreePointArc((-21.915739337, 2.602450802), (-23.263142697, 2.576605271), (-24.562186363, 2.217928037))
            ThreePointArc((-24.562186363, 2.217928037), (-24.56889027, 2.173784387), (-24.575459377, 2.129620475))
            Line((-24.575459377, 2.129620475), (-21.942853375, 2.47620963))
        make_face()
        with BuildLine():
            ThreePointArc((-23.495573413, -5.883801663), (-22.147961087, -5.894040025), (-20.839780068, -5.57027124))
            ThreePointArc((-20.839780068, -5.57027124), (-20.869365339, -5.512888815), (-20.898643838, -5.455349261))
            Line((-20.898643838, -5.455349261), (-23.531249839, -5.801938416))
            ThreePointArc((-23.531249839, -5.801938416), (-23.513474108, -5.842897269), (-23.495573413, -5.883801663))
        make_face()
    extrude(amount=-CUT_EXTRUDE1_DEPTH, mode=Mode.SUBTRACT)

    # Sketch5 → Cut-Extrude2 (cut, up to next)
    with BuildSketch(Plane(origin=(0, 4, 0), x_dir=(1, 0, 0), z_dir=(0, 1, 0)), mode=Mode.PRIVATE) as cut_extrude2_sk1:
        with Locations((-14.606342554, 0)):
            Circle(SKETCH5_R)
    cut_extrude2_tool1 = extrude(cut_extrude2_sk1.sketch, amount=-CUT_EXTRUDE2_REACH, mode=Mode.PRIVATE) & part.part
    add(cut_extrude2_tool1.solids().sort_by_distance((-14.606343, 4, 0))[0], mode=Mode.SUBTRACT)
    # Sketch5 → Cut-Extrude2 (cut, up to next)
    with BuildSketch(Plane(origin=(0, 4, 0), x_dir=(1, 0, 0), z_dir=(0, 1, 0)), mode=Mode.PRIVATE) as cut_extrude2_sk2:
        with Locations((-5.606342554, 0)):
            Circle(SKETCH5_R)
    cut_extrude2_tool2 = extrude(cut_extrude2_sk2.sketch, amount=-CUT_EXTRUDE2_REACH, mode=Mode.PRIVATE) & part.part
    add(cut_extrude2_tool2.solids().sort_by_distance((-5.606343, 4, 0))[0], mode=Mode.SUBTRACT)
    # Sketch5 → Cut-Extrude2 (cut, up to next)
    with BuildSketch(Plane(origin=(0, 4, 0), x_dir=(1, 0, 0), z_dir=(0, 1, 0)), mode=Mode.PRIVATE) as cut_extrude2_sk3:
        with Locations((-10.106342554, 0)):
            Circle(SKETCH5_R_2)
    cut_extrude2_tool3 = extrude(cut_extrude2_sk3.sketch, amount=-CUT_EXTRUDE2_REACH, mode=Mode.PRIVATE) & part.part
    add(cut_extrude2_tool3.solids().sort_by_distance((-10.106343, 4, 0))[0], mode=Mode.SUBTRACT)


solid = part.part
